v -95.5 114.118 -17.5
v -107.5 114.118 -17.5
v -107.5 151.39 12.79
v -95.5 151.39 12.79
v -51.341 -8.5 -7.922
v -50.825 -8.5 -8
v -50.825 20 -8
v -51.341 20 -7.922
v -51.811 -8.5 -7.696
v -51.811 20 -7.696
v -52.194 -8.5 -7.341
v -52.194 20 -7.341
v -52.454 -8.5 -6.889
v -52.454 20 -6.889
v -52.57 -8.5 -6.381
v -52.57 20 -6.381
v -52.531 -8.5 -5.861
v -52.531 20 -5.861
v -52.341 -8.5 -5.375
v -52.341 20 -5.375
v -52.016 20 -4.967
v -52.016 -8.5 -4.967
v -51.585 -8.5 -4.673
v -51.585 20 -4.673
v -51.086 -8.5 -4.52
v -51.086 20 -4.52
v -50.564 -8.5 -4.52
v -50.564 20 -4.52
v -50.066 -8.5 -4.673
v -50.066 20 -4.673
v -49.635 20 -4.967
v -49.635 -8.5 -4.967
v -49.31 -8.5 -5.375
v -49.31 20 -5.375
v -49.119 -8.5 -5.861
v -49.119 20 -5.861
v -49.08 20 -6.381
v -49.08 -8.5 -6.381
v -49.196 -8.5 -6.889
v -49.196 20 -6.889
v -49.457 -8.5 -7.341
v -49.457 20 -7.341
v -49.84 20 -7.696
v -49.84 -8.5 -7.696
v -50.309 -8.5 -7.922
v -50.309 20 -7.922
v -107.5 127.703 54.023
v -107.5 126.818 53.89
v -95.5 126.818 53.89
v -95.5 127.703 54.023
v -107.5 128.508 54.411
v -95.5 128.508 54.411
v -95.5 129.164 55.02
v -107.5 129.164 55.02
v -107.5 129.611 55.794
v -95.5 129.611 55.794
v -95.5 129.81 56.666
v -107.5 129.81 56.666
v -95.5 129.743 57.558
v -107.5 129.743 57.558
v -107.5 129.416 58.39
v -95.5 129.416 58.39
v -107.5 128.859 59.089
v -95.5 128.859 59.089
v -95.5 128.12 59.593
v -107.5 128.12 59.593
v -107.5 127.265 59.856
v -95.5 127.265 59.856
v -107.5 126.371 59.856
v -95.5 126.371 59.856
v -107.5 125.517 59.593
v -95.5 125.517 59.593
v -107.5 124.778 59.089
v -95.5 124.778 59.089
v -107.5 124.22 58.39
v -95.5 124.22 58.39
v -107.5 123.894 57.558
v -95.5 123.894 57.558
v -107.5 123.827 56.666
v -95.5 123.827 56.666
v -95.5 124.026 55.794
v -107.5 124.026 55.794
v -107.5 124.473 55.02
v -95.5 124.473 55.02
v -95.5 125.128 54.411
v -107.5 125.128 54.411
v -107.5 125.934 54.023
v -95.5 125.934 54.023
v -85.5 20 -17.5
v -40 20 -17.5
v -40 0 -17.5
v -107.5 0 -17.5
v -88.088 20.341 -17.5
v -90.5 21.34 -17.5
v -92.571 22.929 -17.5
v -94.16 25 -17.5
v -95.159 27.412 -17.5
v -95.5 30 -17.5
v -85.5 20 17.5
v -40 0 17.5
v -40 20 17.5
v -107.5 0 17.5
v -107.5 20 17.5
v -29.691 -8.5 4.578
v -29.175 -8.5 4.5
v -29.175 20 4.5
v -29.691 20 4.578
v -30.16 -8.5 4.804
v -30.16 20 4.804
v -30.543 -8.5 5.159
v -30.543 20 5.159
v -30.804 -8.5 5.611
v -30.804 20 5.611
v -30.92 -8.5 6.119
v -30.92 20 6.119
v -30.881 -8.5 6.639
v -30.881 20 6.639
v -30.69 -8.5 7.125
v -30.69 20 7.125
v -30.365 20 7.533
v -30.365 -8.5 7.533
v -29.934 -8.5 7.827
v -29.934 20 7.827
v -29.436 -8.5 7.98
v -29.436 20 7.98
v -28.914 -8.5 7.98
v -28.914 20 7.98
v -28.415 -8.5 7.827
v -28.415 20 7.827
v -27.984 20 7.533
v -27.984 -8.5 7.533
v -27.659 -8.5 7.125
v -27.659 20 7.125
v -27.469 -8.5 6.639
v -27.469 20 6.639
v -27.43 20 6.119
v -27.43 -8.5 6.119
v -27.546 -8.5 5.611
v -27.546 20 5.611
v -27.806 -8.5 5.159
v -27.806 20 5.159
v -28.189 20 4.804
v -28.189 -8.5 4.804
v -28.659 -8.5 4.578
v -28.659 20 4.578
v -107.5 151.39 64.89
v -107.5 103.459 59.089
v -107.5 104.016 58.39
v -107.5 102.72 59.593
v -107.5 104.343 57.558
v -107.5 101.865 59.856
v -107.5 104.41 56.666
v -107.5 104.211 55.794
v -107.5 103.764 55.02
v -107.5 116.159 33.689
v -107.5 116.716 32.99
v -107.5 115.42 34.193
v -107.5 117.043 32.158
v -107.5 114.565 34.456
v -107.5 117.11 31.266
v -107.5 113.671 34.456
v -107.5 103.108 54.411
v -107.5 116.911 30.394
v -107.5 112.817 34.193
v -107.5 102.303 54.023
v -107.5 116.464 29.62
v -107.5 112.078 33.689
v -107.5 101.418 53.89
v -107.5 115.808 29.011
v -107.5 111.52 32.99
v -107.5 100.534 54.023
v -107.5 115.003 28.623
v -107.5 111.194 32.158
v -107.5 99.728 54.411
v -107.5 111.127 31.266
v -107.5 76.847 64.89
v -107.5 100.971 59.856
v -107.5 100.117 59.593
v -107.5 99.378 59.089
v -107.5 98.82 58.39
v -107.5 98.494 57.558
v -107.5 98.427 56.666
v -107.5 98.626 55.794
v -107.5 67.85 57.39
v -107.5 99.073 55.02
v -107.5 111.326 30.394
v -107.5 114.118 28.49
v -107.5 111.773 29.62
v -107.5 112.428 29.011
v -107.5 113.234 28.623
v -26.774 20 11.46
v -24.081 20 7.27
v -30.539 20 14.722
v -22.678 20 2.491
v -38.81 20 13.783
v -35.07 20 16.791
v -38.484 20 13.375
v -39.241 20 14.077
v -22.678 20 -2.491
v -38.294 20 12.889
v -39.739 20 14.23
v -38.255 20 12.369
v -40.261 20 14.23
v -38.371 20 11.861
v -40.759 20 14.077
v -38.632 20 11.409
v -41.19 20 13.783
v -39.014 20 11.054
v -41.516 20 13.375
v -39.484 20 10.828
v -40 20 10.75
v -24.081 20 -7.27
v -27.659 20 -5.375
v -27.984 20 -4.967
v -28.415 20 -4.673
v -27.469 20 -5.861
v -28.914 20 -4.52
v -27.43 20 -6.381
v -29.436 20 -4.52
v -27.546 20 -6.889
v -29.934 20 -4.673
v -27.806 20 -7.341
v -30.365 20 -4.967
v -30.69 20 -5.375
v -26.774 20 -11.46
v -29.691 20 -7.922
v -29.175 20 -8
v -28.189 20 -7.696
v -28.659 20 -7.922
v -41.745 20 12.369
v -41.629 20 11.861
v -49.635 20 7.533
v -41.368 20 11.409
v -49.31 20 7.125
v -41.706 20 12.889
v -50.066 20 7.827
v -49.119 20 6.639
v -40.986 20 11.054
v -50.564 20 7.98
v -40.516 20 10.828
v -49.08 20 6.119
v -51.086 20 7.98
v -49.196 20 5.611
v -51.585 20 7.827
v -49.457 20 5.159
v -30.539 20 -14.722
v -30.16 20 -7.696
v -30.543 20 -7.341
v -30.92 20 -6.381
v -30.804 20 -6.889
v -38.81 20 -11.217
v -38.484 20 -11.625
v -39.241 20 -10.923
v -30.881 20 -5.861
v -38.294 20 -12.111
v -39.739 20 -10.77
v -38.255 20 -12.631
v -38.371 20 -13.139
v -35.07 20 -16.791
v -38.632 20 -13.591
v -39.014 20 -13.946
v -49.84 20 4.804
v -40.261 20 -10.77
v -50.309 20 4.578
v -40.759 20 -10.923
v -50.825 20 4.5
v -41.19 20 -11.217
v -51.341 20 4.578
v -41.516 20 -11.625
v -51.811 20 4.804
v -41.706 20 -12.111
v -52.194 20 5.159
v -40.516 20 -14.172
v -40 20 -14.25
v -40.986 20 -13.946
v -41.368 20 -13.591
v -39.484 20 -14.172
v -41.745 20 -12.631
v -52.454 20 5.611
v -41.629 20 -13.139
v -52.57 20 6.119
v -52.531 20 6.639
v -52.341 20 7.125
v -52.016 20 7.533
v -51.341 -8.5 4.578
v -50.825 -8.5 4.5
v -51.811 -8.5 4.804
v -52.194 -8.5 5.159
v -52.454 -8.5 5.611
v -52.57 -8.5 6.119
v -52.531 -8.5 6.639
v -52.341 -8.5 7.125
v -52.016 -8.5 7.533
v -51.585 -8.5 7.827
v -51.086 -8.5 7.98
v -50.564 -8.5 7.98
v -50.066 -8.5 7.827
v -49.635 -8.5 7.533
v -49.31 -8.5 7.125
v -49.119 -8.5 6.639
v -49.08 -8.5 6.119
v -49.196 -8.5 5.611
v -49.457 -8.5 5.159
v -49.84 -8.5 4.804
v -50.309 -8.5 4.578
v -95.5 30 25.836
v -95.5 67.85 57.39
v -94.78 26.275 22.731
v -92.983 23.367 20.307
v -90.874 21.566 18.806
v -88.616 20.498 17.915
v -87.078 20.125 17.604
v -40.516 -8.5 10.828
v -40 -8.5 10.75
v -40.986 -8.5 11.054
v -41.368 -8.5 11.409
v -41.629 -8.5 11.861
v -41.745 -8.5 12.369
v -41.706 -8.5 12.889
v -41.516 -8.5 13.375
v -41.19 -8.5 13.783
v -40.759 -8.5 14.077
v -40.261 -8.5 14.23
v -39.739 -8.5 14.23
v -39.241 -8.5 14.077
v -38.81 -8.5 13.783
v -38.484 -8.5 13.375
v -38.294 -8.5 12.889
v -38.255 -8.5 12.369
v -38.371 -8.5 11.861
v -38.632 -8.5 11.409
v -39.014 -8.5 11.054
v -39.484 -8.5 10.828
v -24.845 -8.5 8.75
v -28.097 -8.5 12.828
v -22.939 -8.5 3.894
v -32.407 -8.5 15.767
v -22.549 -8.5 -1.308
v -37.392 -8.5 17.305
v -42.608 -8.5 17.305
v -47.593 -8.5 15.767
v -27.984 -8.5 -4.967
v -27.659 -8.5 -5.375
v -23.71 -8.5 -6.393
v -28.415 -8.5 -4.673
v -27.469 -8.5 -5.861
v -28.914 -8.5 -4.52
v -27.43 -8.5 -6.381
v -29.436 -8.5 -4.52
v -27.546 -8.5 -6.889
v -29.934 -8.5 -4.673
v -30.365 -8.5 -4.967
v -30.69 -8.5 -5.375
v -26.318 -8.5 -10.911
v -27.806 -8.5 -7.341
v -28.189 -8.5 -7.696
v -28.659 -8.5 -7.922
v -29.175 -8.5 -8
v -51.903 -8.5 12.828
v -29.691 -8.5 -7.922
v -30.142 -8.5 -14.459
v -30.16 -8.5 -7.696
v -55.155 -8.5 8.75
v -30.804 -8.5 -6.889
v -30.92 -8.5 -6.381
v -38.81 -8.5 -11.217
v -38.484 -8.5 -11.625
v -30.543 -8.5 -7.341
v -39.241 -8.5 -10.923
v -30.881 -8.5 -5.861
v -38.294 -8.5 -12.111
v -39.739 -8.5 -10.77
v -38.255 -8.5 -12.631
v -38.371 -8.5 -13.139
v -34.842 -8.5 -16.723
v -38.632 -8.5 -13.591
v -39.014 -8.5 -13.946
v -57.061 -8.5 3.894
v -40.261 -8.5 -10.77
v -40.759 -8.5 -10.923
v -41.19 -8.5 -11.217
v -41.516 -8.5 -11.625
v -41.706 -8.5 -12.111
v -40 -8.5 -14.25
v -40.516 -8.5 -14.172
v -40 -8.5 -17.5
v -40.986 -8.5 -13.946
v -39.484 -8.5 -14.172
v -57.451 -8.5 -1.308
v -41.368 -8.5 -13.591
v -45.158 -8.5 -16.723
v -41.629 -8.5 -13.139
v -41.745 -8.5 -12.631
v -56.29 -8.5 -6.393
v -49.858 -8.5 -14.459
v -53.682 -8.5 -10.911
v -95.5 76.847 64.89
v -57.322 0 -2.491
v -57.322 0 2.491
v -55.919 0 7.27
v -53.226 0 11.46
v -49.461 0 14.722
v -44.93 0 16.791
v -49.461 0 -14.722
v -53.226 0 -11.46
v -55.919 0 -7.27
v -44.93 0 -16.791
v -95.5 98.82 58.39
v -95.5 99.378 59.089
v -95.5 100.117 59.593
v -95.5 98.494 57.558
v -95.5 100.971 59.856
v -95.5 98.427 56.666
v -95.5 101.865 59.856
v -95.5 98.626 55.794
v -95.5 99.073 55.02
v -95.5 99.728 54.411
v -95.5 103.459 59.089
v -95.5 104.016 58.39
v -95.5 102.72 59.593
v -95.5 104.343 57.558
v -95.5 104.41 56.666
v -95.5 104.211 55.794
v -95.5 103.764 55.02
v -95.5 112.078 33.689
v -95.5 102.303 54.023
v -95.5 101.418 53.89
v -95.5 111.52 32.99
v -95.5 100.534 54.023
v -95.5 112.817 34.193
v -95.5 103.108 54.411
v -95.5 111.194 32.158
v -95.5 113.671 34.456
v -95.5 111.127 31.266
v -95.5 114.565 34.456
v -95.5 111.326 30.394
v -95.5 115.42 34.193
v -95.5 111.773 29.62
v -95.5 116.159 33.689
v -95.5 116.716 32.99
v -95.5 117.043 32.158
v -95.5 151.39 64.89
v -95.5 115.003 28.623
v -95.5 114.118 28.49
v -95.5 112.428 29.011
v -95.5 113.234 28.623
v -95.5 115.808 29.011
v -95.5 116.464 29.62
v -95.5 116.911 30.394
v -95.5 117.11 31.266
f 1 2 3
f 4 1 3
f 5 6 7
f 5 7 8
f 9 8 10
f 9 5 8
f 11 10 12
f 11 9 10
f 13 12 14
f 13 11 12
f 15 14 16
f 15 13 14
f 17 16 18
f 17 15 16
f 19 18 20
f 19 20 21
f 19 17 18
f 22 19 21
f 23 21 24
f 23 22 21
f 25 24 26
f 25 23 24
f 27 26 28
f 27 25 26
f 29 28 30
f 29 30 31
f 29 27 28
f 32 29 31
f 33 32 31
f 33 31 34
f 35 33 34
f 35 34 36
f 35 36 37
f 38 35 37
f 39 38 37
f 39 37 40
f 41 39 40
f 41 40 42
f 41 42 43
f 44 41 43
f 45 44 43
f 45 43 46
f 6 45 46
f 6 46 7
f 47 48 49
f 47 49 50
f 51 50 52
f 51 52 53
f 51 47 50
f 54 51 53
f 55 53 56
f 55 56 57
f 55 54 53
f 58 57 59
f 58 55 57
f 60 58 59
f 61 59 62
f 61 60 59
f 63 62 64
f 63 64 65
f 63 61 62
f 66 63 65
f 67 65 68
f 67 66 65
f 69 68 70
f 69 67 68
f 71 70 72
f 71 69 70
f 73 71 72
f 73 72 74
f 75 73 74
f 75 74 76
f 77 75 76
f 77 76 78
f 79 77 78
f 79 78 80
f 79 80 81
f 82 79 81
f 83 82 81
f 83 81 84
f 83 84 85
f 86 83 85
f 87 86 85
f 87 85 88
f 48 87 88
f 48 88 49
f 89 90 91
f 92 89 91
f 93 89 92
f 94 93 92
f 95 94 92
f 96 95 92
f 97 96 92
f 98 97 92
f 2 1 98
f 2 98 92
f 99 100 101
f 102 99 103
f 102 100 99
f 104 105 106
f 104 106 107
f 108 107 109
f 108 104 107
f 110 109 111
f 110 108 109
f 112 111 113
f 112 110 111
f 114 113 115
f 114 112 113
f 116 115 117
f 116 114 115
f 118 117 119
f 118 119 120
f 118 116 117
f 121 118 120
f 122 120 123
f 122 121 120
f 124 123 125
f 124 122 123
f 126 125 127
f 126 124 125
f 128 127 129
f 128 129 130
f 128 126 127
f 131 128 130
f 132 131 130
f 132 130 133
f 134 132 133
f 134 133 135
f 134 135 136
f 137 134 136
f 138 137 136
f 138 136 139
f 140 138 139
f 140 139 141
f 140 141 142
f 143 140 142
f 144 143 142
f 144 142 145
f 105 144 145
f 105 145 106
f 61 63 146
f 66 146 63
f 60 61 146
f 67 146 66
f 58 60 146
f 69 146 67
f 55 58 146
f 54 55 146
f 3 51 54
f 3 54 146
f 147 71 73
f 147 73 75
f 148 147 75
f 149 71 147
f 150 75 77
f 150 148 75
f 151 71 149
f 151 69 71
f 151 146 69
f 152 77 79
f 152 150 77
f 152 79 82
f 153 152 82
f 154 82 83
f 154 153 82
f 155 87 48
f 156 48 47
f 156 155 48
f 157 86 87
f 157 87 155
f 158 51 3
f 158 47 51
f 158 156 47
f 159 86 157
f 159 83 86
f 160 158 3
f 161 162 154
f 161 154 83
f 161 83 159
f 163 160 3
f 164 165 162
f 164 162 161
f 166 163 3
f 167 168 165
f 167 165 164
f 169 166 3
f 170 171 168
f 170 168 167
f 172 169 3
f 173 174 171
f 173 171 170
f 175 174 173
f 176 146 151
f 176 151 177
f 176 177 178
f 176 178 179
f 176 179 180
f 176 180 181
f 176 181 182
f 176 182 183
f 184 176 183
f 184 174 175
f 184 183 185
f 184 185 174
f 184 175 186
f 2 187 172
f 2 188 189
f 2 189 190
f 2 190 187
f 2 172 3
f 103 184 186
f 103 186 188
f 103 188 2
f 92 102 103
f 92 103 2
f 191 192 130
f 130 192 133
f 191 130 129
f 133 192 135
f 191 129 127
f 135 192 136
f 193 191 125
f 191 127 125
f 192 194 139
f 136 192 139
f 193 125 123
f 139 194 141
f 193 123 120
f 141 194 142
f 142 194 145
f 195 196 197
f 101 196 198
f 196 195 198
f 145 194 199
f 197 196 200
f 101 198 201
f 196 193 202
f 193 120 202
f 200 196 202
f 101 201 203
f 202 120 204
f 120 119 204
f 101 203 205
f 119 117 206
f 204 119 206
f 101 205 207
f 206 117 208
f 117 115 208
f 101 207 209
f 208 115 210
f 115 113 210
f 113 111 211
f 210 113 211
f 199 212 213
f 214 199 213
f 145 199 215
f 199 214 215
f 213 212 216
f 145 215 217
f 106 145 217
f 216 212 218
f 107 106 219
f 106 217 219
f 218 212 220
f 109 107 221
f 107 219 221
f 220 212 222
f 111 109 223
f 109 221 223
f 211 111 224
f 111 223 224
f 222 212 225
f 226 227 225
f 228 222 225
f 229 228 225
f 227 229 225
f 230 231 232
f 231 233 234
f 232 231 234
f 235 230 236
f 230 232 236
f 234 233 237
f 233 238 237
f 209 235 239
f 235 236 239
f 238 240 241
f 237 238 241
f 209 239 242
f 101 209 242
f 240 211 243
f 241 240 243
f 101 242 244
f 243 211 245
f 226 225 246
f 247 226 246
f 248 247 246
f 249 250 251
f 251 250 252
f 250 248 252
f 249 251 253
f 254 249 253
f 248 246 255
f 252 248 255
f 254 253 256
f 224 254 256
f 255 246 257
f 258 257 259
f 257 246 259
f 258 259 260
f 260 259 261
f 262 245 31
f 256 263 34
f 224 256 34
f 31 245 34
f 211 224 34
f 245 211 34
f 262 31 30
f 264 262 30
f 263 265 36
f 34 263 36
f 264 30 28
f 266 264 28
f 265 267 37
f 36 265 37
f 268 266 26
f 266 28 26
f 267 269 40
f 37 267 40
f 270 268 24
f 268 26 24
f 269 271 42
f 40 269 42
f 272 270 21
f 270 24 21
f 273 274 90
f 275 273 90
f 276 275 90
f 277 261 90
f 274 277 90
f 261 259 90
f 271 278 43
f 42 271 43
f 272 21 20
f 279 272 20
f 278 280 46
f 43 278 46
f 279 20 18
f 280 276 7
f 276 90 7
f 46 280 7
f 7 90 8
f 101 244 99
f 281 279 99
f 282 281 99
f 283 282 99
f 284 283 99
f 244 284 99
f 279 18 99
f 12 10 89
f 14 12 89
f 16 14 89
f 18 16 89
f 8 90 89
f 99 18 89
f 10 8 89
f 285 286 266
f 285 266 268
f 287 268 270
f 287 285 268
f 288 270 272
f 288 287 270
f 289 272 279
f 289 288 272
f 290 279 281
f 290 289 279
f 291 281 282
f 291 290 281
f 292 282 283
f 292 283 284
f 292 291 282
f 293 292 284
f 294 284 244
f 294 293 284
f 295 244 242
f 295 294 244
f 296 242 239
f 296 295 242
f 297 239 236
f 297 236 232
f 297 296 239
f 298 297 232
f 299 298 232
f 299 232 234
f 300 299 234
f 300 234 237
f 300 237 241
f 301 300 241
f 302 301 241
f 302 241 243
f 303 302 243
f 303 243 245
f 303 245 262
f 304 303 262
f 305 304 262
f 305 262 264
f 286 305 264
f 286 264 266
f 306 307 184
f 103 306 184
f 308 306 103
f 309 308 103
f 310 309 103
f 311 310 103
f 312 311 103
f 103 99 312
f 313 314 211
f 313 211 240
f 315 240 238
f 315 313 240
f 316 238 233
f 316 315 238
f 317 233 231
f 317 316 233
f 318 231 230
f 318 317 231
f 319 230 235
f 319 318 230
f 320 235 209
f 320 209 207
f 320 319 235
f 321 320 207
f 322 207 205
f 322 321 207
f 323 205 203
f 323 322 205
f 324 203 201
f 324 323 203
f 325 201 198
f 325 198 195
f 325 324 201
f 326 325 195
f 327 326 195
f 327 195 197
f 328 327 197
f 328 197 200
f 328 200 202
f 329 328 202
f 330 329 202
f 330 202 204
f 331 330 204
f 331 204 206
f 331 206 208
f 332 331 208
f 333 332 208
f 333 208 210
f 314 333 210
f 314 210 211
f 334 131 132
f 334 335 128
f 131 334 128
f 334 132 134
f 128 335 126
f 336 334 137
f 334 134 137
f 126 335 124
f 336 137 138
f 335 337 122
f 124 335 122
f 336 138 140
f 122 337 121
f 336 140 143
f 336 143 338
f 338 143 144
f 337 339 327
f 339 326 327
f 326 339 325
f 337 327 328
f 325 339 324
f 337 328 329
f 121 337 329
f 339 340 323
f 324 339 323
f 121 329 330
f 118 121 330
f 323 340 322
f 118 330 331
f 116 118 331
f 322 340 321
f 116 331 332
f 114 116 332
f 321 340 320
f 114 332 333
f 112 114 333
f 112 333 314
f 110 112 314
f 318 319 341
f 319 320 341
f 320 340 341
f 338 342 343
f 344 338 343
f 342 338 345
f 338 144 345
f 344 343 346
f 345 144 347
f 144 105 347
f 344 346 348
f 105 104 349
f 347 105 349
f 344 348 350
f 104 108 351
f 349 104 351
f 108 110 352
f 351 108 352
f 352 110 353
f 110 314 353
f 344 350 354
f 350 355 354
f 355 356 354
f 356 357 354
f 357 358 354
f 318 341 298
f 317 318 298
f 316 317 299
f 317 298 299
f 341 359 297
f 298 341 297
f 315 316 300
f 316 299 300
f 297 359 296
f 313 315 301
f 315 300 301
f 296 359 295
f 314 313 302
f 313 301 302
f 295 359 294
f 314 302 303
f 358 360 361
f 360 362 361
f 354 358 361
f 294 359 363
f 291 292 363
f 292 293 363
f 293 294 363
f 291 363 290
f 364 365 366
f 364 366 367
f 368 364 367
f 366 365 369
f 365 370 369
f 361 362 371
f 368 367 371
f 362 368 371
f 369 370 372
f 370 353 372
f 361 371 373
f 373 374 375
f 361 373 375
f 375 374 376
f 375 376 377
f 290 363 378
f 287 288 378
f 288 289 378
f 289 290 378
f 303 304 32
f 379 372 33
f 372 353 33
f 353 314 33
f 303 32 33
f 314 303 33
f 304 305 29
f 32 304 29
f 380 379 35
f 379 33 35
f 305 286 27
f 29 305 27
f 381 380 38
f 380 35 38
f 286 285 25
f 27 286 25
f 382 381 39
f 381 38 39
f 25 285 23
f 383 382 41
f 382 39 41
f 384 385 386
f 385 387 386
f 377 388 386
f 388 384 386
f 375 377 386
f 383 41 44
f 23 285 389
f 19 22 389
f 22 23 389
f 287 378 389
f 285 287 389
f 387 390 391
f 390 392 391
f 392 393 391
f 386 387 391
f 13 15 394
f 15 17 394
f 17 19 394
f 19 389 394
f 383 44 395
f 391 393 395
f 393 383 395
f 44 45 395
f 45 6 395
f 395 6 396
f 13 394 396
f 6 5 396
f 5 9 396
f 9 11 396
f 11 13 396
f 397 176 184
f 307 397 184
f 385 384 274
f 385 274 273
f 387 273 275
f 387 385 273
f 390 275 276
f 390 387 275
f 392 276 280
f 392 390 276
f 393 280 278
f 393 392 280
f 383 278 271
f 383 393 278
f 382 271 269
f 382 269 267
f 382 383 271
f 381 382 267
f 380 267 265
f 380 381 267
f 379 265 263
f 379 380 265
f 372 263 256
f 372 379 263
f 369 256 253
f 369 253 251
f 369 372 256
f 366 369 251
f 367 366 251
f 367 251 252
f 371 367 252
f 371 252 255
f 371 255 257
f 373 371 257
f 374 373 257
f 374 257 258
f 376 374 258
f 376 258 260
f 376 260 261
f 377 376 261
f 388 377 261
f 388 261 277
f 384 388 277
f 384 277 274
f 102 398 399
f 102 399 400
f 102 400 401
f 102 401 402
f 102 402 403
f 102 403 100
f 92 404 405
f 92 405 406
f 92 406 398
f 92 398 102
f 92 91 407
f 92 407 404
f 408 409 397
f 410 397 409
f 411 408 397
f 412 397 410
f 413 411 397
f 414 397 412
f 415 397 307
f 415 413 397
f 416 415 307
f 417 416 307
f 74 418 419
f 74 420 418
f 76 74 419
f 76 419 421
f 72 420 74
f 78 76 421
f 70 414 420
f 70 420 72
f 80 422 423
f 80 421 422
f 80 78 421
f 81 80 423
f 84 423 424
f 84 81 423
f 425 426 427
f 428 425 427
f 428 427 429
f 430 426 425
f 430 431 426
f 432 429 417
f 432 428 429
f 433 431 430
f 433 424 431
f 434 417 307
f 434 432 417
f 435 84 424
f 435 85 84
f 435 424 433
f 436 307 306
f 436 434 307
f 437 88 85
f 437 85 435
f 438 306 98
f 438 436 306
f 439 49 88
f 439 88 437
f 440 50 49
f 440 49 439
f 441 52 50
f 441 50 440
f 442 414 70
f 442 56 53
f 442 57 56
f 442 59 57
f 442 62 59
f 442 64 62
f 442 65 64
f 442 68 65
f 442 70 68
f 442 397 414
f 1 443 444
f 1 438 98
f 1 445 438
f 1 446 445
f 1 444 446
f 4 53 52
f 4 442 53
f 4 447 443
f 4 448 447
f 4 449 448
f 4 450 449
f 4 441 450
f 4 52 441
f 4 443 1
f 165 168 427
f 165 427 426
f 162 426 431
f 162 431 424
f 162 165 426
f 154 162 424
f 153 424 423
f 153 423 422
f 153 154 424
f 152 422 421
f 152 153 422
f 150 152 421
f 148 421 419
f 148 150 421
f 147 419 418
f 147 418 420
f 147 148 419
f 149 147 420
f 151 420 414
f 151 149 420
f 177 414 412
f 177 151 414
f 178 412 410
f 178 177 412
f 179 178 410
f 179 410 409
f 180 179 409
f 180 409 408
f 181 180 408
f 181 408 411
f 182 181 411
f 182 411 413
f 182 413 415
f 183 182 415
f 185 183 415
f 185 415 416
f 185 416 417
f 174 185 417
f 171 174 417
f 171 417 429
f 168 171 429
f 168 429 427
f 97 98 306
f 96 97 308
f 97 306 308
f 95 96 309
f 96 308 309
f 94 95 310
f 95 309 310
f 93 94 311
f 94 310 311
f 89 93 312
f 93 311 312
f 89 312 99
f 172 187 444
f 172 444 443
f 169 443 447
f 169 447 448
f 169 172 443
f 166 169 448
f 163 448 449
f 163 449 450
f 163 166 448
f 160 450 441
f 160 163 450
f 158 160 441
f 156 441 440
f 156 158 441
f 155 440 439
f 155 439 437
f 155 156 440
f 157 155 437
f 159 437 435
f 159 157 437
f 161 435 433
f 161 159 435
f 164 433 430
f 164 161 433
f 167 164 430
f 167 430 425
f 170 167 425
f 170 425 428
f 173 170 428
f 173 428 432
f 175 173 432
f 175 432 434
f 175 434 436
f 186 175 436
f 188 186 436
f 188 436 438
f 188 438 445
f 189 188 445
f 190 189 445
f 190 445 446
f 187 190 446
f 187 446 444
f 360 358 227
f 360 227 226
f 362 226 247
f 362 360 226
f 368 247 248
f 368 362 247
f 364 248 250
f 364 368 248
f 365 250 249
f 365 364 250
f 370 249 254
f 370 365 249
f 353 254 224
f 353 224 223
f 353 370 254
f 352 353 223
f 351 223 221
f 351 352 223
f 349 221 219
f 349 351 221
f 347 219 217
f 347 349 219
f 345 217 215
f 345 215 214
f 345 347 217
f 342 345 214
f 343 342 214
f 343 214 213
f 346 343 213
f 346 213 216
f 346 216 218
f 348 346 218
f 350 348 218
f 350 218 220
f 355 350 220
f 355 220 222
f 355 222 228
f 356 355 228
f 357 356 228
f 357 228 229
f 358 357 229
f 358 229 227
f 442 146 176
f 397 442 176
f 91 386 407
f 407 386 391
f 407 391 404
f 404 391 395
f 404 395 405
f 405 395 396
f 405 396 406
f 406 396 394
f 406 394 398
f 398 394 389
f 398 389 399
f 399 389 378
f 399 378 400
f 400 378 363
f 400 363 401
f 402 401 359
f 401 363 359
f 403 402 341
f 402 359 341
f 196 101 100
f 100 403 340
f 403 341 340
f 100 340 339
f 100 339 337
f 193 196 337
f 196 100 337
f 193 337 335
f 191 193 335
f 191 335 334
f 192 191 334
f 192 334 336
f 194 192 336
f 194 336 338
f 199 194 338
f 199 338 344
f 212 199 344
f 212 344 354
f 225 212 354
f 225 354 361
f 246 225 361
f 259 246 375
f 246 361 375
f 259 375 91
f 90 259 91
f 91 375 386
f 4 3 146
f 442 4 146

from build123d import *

# Parameters (mm, degrees)
BOSS_EXTRUDE1_DEPTH = 20
BOSS_EXTRUDE2_START = 8.5
SKETCH2_R           = 17.5
BOSS_EXTRUDE2_DEPTH = 8.5
BOSS_EXTRUDE3_DEPTH = 12
SKETCH4_R           = 3
CUT_EXTRUDE1_DEPTH  = 186.350058538
SKETCH5_R           = 1.75
CUT_EXTRUDE2_DEPTH  = 186.288354194
FILLET1_R           = 10


with BuildPart() as part:
    # Sketch1 → Boss-Extrude1 (new body)
    with BuildSketch(Plane(origin=(0, 0, 0), x_dir=(1, 0, 0), z_dir=(0, 1, 0))):
        with BuildLine():
            Line((67.5, 17.5), (0, 17.5))
            ThreePointArc((0, 17.5), (-17.5, 0), (0, -17.5))
            Line((0, -17.5), (67.5, -17.5))
            Line((67.5, -17.5), (67.5, 17.5))
        make_face()
    extrude(amount=BOSS_EXTRUDE1_DEPTH)

    # Sketch2 → Boss-Extrude2 (add)
    with BuildSketch(Plane.XZ.offset(BOSS_EXTRUDE2_START)):
        Circle(SKETCH2_R)
    extrude(amount=-BOSS_EXTRUDE2_DEPTH)

    # Sketch3 → Boss-Extrude3 (add)
    with BuildSketch(Plane(origin=(67.5, 0, 0), x_dir=(0, 0, -1), z_dir=(1, 0, 0))):
        Polygon((-17.5, 0), (17.5, 0), (17.5, 114.118307847), (-12.79, 151.39), (-64.89, 151.39), (-64.89, 76.846615693), (-57.39, 67.85), (-17.5, 20), align=None)
    extrude(amount=-BOSS_EXTRUDE3_DEPTH)

    # Sketch4 → Cut-Extrude1 (cut, through all)
    with BuildSketch(Plane(origin=(67.5, 0, 0), x_dir=(0, 0, -1), z_dir=(1, 0, 0))):
        with Locations((-56.89, 101.418307847)):
            Circle(SKETCH4_R)
        with Locations((-56.89, 126.818307847)):
            Circle(SKETCH4_R)
        with Locations((-31.49, 114.118307847)):
            Circle(SKETCH4_R)
    extrude(amount=-CUT_EXTRUDE1_DEPTH, mode=Mode.SUBTRACT)

    # Sketch5 → Cut-Extrude2 (cut, through all)
    with BuildSketch(Plane.XZ.offset(8.5)):
        with Locations((0, 12.5)):
            Circle(SKETCH5_R)
        with Locations((10.825317547, 6.25)):
            Circle(SKETCH5_R)
        with Locations((10.825317547, -6.25)):
            Circle(SKETCH5_R)
        with Locations((0, -12.5)):
            Circle(SKETCH5_R)
        with Locations((-10.825317547, -6.25)):
            Circle(SKETCH5_R)
        with Locations((-10.825317547, 6.25)):
            Circle(SKETCH5_R)
    extrude(amount=-CUT_EXTRUDE2_DEPTH, mode=Mode.SUBTRACT)

    # Fillet1
    fillet1_edges = [part.edges().sort_by_distance(p)[0] for p in [
        (55.5, 20, 0),
    ]]
    fillet(fillet1_edges, radius=FILLET1_R)


with BuildPart() as body_2:
    # Mirror1: mirrored copy
    add(part.part.mirror(Plane(origin=(-20, 0, 0), x_dir=(0, 0, 1), z_dir=(1, 0, 0))))


solid = body_2.part
